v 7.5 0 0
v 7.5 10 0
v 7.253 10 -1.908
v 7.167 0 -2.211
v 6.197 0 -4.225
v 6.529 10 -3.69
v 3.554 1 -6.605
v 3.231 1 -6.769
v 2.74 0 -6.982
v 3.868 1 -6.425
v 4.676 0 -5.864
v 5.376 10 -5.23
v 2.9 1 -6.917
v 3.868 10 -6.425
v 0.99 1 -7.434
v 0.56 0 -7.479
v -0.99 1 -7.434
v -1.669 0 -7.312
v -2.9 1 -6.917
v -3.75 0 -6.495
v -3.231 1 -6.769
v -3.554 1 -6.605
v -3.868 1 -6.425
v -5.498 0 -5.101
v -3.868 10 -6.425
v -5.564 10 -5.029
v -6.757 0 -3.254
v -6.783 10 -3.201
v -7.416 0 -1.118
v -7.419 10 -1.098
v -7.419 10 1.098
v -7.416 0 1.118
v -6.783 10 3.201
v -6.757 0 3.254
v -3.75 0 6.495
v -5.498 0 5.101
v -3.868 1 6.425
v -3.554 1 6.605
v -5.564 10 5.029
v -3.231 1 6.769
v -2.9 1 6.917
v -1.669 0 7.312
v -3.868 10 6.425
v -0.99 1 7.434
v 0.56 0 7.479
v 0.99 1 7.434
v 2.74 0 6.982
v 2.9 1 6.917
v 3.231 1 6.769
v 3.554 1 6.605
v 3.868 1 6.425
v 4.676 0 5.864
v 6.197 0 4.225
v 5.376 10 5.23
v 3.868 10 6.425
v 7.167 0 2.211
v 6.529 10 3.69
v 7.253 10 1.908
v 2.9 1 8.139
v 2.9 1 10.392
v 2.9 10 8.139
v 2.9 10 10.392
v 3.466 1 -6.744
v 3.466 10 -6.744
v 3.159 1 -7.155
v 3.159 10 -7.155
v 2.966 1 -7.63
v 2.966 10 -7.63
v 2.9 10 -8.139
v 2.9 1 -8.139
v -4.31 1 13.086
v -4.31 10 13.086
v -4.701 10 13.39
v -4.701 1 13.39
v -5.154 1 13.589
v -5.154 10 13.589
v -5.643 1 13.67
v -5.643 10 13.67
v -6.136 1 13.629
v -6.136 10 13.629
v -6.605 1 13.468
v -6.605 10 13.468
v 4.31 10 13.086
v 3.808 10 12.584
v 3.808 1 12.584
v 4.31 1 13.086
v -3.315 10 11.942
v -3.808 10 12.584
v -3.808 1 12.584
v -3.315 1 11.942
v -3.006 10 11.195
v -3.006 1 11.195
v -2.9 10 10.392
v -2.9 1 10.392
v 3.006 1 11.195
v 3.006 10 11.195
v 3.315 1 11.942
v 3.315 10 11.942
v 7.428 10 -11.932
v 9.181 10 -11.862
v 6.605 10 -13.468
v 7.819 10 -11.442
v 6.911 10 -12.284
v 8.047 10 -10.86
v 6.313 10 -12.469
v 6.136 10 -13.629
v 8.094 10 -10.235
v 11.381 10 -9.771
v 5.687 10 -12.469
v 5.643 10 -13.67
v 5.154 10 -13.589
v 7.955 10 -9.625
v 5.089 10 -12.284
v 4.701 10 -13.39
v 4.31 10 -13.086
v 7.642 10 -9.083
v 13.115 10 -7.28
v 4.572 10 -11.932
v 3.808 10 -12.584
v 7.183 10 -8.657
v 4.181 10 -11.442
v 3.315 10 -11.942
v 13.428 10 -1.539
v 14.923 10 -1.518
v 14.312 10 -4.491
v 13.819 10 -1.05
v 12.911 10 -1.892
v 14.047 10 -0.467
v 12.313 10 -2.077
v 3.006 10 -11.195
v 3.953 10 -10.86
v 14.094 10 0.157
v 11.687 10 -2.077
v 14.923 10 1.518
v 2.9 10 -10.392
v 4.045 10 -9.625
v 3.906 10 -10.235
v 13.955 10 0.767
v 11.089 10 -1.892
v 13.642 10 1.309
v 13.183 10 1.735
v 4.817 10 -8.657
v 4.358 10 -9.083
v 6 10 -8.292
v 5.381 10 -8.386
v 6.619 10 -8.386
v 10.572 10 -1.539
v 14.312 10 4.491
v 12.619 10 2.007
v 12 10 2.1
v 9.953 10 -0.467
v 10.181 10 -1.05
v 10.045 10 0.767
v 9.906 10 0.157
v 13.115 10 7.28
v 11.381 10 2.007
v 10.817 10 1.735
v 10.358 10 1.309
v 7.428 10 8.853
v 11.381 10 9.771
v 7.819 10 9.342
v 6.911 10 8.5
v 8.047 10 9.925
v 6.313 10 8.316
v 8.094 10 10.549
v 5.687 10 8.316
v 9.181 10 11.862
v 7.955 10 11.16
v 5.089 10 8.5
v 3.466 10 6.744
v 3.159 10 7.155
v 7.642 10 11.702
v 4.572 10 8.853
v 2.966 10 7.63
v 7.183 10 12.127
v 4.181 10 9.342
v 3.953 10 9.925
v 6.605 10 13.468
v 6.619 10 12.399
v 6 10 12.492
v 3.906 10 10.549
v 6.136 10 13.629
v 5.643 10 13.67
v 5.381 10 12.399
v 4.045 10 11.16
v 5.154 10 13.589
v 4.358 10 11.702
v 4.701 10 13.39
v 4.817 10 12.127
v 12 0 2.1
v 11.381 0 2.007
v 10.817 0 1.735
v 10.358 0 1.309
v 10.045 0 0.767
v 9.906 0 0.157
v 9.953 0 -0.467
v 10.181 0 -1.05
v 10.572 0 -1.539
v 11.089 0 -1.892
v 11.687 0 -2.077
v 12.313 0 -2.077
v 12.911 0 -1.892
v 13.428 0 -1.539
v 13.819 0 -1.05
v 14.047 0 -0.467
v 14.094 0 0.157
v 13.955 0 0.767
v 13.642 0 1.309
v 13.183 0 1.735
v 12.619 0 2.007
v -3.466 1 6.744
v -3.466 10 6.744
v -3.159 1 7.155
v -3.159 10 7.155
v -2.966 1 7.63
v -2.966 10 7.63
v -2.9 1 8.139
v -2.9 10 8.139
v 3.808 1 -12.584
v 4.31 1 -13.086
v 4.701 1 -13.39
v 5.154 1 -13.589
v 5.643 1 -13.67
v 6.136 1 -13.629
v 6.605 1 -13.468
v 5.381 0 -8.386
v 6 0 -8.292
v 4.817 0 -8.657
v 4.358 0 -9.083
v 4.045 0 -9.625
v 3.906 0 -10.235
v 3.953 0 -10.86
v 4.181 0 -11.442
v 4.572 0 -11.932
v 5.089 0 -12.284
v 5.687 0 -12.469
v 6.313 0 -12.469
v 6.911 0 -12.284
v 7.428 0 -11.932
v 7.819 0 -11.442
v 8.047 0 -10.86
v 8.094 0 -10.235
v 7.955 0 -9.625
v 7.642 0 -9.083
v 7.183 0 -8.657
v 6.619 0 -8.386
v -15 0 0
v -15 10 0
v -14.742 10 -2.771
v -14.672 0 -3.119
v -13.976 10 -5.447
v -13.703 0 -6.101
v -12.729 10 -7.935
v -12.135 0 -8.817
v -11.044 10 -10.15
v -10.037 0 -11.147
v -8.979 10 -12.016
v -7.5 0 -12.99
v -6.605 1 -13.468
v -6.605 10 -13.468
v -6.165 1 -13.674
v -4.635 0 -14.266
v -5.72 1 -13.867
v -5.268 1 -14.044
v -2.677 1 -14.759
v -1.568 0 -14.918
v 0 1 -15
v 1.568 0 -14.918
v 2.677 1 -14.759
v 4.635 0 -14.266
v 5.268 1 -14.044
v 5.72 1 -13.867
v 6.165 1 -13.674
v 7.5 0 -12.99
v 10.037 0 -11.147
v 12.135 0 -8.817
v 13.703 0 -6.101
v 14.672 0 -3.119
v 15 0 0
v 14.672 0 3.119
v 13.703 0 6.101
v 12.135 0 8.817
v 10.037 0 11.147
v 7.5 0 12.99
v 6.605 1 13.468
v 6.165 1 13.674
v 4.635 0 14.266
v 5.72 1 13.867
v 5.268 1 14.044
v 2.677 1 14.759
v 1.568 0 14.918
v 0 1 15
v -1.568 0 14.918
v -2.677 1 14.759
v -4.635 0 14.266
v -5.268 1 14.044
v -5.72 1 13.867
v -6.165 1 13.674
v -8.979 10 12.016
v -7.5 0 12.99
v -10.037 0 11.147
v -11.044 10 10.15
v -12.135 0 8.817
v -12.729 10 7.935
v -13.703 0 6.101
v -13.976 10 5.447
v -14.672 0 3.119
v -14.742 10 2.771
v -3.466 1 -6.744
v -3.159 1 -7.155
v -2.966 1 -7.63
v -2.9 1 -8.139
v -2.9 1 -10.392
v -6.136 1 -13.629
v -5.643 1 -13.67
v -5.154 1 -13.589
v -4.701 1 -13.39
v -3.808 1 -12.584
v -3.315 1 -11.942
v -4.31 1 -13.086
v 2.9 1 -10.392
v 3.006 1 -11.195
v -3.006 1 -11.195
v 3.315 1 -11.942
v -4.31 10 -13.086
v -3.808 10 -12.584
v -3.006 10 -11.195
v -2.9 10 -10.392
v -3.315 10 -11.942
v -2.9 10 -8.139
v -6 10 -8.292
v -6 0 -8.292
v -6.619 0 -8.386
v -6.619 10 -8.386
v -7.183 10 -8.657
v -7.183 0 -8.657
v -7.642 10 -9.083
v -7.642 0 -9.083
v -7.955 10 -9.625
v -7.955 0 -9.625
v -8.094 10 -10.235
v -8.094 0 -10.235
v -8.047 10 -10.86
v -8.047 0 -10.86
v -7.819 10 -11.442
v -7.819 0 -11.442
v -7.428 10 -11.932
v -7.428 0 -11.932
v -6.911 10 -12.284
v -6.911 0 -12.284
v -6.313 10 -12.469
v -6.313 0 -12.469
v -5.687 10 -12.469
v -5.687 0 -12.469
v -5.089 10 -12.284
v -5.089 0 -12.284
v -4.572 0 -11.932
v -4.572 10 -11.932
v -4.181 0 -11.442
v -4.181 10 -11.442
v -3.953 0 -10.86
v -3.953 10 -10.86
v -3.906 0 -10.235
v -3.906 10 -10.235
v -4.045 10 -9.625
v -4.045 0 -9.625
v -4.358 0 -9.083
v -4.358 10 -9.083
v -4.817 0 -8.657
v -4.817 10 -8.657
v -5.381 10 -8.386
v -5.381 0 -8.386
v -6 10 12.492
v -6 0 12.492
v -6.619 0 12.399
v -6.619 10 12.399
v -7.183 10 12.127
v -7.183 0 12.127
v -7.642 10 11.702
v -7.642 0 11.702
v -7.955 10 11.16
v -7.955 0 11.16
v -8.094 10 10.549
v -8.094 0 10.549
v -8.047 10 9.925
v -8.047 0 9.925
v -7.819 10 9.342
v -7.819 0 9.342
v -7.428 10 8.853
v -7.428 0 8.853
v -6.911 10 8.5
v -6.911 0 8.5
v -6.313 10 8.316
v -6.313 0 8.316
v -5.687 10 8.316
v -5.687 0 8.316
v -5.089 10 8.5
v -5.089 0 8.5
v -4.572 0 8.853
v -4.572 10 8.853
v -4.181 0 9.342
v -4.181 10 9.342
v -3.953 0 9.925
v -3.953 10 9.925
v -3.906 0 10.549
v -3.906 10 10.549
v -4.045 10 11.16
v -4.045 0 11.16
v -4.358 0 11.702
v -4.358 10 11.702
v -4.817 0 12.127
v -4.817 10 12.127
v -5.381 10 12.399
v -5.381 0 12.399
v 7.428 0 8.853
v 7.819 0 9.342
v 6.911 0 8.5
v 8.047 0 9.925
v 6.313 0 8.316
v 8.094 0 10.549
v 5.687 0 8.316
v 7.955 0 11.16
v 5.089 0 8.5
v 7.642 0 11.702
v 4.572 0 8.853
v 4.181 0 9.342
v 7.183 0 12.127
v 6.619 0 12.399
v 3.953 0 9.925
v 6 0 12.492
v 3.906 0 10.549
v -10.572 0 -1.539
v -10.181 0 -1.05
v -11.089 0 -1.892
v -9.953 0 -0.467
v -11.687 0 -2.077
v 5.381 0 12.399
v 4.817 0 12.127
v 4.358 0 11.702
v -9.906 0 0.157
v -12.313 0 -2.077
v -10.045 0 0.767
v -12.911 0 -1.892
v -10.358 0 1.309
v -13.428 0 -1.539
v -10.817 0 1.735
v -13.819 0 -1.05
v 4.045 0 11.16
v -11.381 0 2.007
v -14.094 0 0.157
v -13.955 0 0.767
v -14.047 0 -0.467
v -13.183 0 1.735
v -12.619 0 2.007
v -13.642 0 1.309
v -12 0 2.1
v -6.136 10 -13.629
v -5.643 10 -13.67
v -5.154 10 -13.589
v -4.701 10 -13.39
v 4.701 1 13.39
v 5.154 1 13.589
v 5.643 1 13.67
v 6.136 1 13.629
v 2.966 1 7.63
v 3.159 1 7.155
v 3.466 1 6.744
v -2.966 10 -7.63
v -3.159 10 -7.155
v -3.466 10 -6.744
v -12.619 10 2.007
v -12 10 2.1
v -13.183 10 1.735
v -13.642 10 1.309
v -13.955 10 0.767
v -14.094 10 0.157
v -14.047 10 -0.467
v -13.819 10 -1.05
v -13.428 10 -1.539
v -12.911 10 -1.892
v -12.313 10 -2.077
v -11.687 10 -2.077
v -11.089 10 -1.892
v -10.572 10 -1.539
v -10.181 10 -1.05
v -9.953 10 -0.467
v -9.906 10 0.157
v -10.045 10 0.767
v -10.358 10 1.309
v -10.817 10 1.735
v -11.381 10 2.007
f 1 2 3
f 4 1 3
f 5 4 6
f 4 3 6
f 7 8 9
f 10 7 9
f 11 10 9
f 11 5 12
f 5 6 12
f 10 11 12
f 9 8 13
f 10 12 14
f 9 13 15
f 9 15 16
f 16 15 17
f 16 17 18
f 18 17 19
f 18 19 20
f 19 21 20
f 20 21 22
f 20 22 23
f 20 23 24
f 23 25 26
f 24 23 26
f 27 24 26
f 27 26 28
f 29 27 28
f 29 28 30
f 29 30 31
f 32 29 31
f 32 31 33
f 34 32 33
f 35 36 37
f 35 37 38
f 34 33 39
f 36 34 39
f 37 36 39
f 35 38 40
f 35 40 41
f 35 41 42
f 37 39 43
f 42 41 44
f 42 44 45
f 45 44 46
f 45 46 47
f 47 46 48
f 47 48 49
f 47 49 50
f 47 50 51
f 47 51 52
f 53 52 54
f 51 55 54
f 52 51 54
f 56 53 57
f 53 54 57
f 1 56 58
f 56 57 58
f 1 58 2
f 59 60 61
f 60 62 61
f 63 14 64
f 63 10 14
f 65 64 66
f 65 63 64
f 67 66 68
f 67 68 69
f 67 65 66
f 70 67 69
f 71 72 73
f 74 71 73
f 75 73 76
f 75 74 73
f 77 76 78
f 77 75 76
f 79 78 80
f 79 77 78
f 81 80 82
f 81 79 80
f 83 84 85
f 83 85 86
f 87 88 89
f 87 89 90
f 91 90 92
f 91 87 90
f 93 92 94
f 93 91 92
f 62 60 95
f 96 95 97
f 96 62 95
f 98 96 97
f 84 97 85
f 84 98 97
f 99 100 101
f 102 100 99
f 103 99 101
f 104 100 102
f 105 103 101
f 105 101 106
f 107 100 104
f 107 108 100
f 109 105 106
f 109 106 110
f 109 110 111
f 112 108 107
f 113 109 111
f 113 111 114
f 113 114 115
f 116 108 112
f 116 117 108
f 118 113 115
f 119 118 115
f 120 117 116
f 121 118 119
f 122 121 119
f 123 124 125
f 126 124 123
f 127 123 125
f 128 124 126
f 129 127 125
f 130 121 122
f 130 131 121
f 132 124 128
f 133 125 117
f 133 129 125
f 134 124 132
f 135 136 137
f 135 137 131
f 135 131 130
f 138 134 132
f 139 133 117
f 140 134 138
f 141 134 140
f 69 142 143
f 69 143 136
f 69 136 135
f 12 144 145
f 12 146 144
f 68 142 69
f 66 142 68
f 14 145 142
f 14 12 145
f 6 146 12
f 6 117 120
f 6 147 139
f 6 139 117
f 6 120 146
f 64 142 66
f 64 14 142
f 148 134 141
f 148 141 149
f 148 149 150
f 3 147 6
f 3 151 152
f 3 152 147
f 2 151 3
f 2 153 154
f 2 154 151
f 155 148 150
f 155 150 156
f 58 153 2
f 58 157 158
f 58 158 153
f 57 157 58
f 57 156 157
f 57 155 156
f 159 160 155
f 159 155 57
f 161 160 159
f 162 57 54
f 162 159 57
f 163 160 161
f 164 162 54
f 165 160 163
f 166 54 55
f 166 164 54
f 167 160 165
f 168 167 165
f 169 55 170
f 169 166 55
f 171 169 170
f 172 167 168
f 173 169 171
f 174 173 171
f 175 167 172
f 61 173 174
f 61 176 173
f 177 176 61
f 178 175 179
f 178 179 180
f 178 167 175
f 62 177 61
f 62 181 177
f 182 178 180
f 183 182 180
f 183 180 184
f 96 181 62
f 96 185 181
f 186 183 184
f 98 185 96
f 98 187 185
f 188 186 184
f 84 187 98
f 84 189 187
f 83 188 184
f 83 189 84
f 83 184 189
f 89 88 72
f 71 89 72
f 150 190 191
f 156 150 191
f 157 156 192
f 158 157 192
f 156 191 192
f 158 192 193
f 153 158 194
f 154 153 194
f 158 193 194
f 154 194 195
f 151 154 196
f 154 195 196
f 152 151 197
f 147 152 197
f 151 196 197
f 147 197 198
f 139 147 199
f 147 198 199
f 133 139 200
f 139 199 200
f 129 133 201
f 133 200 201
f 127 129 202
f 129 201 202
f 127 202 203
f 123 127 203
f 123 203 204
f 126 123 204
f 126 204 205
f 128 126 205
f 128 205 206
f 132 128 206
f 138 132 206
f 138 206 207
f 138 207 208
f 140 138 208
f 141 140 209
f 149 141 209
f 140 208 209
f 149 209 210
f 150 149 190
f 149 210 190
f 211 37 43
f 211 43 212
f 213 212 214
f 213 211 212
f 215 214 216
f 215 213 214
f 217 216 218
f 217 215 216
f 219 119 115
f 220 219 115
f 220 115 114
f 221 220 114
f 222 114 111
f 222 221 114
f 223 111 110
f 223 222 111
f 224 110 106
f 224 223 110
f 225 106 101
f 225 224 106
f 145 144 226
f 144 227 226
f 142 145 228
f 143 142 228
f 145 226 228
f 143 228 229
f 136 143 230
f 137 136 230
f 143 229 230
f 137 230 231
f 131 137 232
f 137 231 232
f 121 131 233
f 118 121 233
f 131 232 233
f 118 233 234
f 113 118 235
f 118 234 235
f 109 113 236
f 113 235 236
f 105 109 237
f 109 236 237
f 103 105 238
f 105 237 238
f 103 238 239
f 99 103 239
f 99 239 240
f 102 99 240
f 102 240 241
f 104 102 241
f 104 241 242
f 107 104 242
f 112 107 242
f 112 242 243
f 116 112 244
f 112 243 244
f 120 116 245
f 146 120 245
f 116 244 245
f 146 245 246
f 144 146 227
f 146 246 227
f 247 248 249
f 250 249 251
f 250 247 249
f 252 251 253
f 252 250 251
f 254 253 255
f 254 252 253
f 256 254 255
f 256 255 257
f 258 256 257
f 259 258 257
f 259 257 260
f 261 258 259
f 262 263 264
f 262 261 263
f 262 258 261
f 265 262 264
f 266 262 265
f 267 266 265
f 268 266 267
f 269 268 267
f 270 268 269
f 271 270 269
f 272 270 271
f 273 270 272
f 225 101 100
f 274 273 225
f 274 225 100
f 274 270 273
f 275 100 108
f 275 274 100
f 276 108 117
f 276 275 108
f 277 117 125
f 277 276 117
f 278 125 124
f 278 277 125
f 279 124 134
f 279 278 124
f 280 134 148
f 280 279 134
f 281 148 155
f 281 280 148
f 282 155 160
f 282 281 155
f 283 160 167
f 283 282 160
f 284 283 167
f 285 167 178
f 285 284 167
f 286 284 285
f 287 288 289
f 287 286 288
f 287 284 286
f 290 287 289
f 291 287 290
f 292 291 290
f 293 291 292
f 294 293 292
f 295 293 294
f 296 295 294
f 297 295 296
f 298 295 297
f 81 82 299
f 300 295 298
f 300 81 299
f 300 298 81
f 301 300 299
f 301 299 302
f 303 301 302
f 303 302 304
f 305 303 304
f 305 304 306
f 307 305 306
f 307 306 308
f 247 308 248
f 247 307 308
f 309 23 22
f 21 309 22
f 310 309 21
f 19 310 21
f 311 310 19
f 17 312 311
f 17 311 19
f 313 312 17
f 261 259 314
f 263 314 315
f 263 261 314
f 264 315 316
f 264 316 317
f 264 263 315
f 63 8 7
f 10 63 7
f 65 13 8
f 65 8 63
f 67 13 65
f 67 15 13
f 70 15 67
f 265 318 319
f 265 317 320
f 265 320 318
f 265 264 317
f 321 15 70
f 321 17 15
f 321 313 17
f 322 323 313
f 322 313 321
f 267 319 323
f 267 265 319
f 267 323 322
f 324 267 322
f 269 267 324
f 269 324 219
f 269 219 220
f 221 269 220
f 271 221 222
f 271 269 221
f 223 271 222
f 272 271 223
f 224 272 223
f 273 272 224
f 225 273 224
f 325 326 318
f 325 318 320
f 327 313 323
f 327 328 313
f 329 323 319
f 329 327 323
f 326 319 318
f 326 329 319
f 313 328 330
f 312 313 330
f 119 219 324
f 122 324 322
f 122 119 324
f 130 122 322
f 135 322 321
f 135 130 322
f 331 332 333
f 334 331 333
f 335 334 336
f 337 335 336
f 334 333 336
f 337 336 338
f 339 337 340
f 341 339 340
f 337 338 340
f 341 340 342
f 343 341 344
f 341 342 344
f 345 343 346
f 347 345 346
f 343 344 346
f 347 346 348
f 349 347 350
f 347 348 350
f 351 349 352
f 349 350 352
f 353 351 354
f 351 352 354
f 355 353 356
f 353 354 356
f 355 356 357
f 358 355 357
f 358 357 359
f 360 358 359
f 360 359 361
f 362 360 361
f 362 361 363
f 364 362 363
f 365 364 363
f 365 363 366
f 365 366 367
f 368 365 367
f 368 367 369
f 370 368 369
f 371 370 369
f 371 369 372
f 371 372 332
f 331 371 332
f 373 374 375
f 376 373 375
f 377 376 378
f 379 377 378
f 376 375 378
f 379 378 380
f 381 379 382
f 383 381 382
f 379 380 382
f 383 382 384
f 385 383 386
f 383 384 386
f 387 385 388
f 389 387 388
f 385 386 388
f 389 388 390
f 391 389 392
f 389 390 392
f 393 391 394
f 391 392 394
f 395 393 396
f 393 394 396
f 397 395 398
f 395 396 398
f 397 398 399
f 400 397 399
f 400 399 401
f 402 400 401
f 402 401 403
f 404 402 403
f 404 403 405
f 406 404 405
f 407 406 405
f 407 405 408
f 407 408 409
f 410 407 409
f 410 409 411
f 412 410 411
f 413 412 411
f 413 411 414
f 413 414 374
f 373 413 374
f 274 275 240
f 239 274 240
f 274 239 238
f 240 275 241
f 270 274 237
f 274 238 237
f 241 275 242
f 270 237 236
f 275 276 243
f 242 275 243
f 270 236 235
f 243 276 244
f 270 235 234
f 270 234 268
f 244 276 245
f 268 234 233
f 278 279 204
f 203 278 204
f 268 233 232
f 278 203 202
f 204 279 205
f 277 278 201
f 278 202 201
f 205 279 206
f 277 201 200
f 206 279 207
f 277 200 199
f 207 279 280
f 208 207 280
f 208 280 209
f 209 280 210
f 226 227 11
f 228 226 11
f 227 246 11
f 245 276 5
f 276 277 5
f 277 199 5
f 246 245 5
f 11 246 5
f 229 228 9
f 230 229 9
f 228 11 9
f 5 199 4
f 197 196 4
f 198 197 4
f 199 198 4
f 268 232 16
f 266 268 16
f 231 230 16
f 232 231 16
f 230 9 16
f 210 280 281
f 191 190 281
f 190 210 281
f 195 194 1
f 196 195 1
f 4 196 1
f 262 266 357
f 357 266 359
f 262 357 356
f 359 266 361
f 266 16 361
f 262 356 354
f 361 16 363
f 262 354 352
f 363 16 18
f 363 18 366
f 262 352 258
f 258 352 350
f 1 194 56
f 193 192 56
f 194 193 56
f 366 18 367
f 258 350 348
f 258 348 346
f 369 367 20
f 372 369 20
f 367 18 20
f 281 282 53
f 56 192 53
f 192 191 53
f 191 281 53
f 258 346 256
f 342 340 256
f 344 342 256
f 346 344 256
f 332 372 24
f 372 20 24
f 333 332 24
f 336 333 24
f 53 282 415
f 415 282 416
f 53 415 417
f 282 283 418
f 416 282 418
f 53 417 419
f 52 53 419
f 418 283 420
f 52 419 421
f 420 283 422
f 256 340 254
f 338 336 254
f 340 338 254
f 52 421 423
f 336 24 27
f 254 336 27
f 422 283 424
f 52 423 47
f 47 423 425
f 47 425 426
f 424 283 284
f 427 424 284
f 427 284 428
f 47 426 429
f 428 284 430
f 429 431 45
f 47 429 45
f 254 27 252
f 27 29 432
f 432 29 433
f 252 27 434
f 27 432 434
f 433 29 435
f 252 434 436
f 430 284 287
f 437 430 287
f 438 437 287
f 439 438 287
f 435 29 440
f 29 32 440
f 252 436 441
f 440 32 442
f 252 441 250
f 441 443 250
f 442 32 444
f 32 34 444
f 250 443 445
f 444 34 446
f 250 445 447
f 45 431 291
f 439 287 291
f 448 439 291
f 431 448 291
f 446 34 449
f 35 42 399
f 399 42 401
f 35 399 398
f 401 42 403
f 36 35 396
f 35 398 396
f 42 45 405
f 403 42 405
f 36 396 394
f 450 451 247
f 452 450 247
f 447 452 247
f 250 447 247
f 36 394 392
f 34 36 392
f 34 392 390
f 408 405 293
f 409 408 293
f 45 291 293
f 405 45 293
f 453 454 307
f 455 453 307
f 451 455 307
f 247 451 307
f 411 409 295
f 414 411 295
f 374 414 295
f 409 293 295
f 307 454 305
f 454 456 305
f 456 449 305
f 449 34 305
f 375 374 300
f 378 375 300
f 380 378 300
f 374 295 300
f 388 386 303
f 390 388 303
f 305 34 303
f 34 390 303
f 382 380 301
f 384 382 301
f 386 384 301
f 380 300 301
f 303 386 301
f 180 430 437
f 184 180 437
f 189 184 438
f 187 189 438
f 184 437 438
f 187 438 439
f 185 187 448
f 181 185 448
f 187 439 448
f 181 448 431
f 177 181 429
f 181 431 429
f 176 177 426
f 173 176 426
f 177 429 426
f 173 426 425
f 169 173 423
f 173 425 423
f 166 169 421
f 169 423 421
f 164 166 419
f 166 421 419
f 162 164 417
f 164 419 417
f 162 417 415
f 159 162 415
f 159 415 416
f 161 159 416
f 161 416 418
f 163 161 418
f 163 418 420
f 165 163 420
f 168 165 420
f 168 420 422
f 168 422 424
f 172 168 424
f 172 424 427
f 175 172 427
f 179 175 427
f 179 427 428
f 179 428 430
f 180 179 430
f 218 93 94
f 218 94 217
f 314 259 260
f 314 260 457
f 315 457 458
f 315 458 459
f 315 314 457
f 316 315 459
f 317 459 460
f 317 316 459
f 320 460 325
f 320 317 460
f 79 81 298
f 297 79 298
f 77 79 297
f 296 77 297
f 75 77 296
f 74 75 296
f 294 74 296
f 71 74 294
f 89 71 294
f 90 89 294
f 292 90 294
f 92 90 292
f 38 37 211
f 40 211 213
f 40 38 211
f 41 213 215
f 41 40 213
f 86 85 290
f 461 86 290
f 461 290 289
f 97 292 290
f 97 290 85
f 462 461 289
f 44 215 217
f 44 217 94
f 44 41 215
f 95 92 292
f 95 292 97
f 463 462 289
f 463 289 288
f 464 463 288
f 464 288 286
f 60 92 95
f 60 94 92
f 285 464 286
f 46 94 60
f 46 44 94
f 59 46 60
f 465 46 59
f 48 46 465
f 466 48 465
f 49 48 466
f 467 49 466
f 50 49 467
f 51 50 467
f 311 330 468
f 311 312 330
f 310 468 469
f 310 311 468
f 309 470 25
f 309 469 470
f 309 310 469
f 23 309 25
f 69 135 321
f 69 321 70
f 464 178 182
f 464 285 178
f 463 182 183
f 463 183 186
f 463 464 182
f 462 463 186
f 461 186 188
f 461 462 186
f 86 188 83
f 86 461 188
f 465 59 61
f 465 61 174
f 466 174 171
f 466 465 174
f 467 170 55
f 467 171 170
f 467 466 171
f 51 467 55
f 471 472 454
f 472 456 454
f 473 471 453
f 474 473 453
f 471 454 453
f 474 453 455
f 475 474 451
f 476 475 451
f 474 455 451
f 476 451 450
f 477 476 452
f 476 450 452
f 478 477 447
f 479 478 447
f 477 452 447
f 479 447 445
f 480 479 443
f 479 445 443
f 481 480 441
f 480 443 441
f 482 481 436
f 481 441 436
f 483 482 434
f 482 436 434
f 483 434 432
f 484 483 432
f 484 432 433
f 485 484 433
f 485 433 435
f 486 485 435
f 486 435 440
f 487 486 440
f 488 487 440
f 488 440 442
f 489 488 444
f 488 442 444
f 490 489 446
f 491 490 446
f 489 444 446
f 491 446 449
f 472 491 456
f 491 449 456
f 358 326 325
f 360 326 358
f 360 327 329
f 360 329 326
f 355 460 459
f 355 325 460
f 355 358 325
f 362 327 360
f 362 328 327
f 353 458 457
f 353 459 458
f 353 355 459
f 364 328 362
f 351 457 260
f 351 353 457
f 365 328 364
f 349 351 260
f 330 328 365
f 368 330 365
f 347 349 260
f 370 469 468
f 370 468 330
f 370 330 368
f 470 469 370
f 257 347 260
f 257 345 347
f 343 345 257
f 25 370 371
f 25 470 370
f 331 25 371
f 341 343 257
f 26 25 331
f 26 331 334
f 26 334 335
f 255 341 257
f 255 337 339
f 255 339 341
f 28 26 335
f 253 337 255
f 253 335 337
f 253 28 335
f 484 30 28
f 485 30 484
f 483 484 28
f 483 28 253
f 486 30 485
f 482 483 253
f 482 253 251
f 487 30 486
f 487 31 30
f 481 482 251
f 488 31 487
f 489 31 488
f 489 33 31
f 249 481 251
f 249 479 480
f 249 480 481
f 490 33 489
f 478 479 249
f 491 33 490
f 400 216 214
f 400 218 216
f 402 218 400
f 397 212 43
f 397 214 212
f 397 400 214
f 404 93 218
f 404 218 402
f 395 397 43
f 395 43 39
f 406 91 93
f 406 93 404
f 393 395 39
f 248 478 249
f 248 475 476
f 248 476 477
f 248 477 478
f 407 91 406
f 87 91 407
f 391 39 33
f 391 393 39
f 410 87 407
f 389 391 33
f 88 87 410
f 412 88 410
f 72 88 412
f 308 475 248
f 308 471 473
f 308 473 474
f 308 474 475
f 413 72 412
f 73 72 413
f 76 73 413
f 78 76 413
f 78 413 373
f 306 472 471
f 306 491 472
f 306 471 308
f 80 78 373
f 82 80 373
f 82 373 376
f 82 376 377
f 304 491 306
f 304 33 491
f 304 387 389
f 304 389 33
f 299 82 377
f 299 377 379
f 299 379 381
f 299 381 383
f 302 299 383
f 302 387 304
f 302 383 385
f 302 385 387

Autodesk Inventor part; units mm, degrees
ref_plane "YZ Plane" through (0, 0, 0) normal (1, 0, 0) x (0, 1, 0)
ref_plane "XZ Plane" through (0, 0, 0) normal (0, 1, 0) x (-1, 0, 0)
ref_plane "XY Plane" through (0, 0, 0) normal (0, 0, 1) x (1, 0, 0)
sketch "スケッチ1" plane through (0, 0, 0) normal (0, 1, 0) x (-1, 0, 0)
  circle A0 centre (0, 0) radius 15
  dimension "d0" = 30
extrude "押し出し1" add sketch "スケッチ1" along normal blind 10
sketch "スケッチ2" plane through (0, 10, 0) normal (0, 1, 0) x (1, 0, 0)
  circle A0 centre (0, 0) radius 12
  point P0 (-12, 0)
  point P1 (-6, -10.3923)
  point P2 (6, -10.3923)
  point P3 (12, 0)
  point P4 (6, 10.3923)
  point P5 (-6, 10.3923)
  dimension "d3" = 24
  dimension "d6" = 360
hole "穴1" at (-12, 10, 0) at (-6, 10, 10.3923) at (6, 10, 10.3923) at (12, 10, 0) at (6, 10, -10.3923) at (-6, 10, -10.3923) direction (0, -1, 0) diameter 4.2 end through all
sketch "スケッチ3" plane through (0, 10, 0) normal (0, 1, 0) x (1, 0, 0)
  circle A0 centre (0, 0) radius 7.5
  dimension "d15" = 15
extrude "押し出し2" cut sketch "スケッチ3" against normal blind 10
sketch "スケッチ4" plane through (0, 10, 0) normal (0, 1, 0) x (1, 0, 0)
  circle A0 centre (-6, -10.3923) radius 2.1 projected
  circle A1 centre (6, -10.3923) radius 2.1 projected
  line L0 (-6, -10.3923) -> (6, -10.3923)
  circle A2 centre (-6, -10.3923) radius 3.1
  circle A3 centre (6, -10.3923) radius 3.1
  line L1 (-2.9, -10.3923) -> (-2.9, -6.9166)
  circle A4 centre (0, 0) radius 7.5 projected
  line L2 (2.9, -10.3923) -> (2.9, -6.9166)
  line L3 (-3.808, -12.5843) -> (-5.2681, -14.0445)
  circle A5 centre (0, 0) radius 15 projected
  line L4 (3.808, -12.5843) -> (5.2681, -14.0445)
  line L5 (-15, 0) -> (0, 0)
  circle A6 centre (-6, 10.3923) radius 3.1
  circle A7 centre (6, 10.3923) radius 3.1
  line L6 (-2.9, 10.3923) -> (-2.9, 6.9166)
  line L7 (2.9, 10.3923) -> (2.9, 6.9166)
  line L8 (-3.808, 12.5843) -> (-5.2681, 14.0445)
  line L9 (3.808, 12.5843) -> (5.2681, 14.0445)
  circle A8 centre (0, 0) radius 7.5
  circle A9 centre (0, 0) radius 15
  point P0 (-5.2681, 14.0445)
  dimension "d18" = 1
  dimension "d19" = 1
  dimension "d20" = 135
extrude "押し出し3" cut sketch "スケッチ4" against normal blind 9 contours L1 A4 L2 L0 | L0 A3 L4 A5 L3 A2 | L6 A6 L8 A5 L9 A7 L7 A4
fillet "フィレット1" radius 2 8 edges at (5.2681, 5.5, -14.0445) (-5.2681, 5.5, -14.0445) (5.2681, 5.5, 14.0445) (-5.2681, 5.5, 14.0445) (-2.9, 5.5, -6.9166) (-2.9, 5.5, 6.9166) (2.9, 5.5, 6.9166) (2.9, 5.5, -6.9166)
sketch "スケッチ5" plane through (0, 1, 0) normal (0, 1, 0) x (1, 0, 0)
  arc A0 (-6.6047, -13.4677) -> (6.6047, -13.4677) centre (0, 0) ccw projected
  line L0 (-2.9, -10.3923) -> (-2.9, -8.1388) projected
  arc A1 (6.6047, -13.4677) -> (-6.6047, -13.4677) centre (0, 0) ccw projected
  circle A2 centre (0, 0) radius 15 projected
  line L1 (-6.1706, -13.672) -> (6.1706, -13.672)
  arc A3 (4.3098, -13.0862) -> (6.6047, -13.4677) centre (5.724, -11.672) ccw projected
  line L2 (6.1706, -13.672) -> (-6.1706, -13.672)
  line L3 (-6.1706, -13.672) -> (-6.1706, -24.6433)
  line L4 (-6.1706, -24.6433) -> (6.1706, -24.6433)
  line L5 (6.1706, -24.6433) -> (6.1706, -13.672)
  line L6 (-6.1706, -24.6433) -> (-15.2853, -20.5296)
  line L7 (-15.2853, -20.5296) -> (-10.7439, -10.4675)
  line L8 (-6.1706, -13.672) -> (-11.1715, -11.4149)
  point P0 (-10.7439, -10.4675)
  dimension "d28" = 10
  dimension "d29" = 10
extrude "押し出し4" [suppressed]
sketch "スケッチ6" plane through (0, 1, 0) normal (0, 1, 0) x (1, 0, 0)
  line L0 (-15.6324, -20.1472) -> (-7.4753, -3.7413) projected
  line L1 (-14.742, -18.3563) -> (-2.1859, -24.5993)
  line L2 (6.6781, -24.5993) -> (-6.6781, -24.5993) projected
  line L3 (-6.6781, -24.5993) -> (-15.6324, -20.1472) projected
  line L4 (-10.7006, -22.5993) -> (6.6781, -22.5993)
  line L5 (6.6781, 0) -> (6.6781, -24.5993) projected
  line L6 (-15.6324, -20.1472) -> (-6.6781, -24.5993) projected
  line L7 (-6.6781, -24.5993) -> (6.6781, -24.5993) projected
  line L8 (0, -24.5993) -> (0, -22.5993)
  point P0 (0, 0)
  point P1 (-15, 0)
  point P2 (-15, 0)
  point P3 (-6.2084, -22.5993)
  dimension "d33" = 2
  dimension "d34" = 2
extrude "押し出し5" [suppressed]
properties part number "servoplate_forR2" material "アルミニウム 6061"
